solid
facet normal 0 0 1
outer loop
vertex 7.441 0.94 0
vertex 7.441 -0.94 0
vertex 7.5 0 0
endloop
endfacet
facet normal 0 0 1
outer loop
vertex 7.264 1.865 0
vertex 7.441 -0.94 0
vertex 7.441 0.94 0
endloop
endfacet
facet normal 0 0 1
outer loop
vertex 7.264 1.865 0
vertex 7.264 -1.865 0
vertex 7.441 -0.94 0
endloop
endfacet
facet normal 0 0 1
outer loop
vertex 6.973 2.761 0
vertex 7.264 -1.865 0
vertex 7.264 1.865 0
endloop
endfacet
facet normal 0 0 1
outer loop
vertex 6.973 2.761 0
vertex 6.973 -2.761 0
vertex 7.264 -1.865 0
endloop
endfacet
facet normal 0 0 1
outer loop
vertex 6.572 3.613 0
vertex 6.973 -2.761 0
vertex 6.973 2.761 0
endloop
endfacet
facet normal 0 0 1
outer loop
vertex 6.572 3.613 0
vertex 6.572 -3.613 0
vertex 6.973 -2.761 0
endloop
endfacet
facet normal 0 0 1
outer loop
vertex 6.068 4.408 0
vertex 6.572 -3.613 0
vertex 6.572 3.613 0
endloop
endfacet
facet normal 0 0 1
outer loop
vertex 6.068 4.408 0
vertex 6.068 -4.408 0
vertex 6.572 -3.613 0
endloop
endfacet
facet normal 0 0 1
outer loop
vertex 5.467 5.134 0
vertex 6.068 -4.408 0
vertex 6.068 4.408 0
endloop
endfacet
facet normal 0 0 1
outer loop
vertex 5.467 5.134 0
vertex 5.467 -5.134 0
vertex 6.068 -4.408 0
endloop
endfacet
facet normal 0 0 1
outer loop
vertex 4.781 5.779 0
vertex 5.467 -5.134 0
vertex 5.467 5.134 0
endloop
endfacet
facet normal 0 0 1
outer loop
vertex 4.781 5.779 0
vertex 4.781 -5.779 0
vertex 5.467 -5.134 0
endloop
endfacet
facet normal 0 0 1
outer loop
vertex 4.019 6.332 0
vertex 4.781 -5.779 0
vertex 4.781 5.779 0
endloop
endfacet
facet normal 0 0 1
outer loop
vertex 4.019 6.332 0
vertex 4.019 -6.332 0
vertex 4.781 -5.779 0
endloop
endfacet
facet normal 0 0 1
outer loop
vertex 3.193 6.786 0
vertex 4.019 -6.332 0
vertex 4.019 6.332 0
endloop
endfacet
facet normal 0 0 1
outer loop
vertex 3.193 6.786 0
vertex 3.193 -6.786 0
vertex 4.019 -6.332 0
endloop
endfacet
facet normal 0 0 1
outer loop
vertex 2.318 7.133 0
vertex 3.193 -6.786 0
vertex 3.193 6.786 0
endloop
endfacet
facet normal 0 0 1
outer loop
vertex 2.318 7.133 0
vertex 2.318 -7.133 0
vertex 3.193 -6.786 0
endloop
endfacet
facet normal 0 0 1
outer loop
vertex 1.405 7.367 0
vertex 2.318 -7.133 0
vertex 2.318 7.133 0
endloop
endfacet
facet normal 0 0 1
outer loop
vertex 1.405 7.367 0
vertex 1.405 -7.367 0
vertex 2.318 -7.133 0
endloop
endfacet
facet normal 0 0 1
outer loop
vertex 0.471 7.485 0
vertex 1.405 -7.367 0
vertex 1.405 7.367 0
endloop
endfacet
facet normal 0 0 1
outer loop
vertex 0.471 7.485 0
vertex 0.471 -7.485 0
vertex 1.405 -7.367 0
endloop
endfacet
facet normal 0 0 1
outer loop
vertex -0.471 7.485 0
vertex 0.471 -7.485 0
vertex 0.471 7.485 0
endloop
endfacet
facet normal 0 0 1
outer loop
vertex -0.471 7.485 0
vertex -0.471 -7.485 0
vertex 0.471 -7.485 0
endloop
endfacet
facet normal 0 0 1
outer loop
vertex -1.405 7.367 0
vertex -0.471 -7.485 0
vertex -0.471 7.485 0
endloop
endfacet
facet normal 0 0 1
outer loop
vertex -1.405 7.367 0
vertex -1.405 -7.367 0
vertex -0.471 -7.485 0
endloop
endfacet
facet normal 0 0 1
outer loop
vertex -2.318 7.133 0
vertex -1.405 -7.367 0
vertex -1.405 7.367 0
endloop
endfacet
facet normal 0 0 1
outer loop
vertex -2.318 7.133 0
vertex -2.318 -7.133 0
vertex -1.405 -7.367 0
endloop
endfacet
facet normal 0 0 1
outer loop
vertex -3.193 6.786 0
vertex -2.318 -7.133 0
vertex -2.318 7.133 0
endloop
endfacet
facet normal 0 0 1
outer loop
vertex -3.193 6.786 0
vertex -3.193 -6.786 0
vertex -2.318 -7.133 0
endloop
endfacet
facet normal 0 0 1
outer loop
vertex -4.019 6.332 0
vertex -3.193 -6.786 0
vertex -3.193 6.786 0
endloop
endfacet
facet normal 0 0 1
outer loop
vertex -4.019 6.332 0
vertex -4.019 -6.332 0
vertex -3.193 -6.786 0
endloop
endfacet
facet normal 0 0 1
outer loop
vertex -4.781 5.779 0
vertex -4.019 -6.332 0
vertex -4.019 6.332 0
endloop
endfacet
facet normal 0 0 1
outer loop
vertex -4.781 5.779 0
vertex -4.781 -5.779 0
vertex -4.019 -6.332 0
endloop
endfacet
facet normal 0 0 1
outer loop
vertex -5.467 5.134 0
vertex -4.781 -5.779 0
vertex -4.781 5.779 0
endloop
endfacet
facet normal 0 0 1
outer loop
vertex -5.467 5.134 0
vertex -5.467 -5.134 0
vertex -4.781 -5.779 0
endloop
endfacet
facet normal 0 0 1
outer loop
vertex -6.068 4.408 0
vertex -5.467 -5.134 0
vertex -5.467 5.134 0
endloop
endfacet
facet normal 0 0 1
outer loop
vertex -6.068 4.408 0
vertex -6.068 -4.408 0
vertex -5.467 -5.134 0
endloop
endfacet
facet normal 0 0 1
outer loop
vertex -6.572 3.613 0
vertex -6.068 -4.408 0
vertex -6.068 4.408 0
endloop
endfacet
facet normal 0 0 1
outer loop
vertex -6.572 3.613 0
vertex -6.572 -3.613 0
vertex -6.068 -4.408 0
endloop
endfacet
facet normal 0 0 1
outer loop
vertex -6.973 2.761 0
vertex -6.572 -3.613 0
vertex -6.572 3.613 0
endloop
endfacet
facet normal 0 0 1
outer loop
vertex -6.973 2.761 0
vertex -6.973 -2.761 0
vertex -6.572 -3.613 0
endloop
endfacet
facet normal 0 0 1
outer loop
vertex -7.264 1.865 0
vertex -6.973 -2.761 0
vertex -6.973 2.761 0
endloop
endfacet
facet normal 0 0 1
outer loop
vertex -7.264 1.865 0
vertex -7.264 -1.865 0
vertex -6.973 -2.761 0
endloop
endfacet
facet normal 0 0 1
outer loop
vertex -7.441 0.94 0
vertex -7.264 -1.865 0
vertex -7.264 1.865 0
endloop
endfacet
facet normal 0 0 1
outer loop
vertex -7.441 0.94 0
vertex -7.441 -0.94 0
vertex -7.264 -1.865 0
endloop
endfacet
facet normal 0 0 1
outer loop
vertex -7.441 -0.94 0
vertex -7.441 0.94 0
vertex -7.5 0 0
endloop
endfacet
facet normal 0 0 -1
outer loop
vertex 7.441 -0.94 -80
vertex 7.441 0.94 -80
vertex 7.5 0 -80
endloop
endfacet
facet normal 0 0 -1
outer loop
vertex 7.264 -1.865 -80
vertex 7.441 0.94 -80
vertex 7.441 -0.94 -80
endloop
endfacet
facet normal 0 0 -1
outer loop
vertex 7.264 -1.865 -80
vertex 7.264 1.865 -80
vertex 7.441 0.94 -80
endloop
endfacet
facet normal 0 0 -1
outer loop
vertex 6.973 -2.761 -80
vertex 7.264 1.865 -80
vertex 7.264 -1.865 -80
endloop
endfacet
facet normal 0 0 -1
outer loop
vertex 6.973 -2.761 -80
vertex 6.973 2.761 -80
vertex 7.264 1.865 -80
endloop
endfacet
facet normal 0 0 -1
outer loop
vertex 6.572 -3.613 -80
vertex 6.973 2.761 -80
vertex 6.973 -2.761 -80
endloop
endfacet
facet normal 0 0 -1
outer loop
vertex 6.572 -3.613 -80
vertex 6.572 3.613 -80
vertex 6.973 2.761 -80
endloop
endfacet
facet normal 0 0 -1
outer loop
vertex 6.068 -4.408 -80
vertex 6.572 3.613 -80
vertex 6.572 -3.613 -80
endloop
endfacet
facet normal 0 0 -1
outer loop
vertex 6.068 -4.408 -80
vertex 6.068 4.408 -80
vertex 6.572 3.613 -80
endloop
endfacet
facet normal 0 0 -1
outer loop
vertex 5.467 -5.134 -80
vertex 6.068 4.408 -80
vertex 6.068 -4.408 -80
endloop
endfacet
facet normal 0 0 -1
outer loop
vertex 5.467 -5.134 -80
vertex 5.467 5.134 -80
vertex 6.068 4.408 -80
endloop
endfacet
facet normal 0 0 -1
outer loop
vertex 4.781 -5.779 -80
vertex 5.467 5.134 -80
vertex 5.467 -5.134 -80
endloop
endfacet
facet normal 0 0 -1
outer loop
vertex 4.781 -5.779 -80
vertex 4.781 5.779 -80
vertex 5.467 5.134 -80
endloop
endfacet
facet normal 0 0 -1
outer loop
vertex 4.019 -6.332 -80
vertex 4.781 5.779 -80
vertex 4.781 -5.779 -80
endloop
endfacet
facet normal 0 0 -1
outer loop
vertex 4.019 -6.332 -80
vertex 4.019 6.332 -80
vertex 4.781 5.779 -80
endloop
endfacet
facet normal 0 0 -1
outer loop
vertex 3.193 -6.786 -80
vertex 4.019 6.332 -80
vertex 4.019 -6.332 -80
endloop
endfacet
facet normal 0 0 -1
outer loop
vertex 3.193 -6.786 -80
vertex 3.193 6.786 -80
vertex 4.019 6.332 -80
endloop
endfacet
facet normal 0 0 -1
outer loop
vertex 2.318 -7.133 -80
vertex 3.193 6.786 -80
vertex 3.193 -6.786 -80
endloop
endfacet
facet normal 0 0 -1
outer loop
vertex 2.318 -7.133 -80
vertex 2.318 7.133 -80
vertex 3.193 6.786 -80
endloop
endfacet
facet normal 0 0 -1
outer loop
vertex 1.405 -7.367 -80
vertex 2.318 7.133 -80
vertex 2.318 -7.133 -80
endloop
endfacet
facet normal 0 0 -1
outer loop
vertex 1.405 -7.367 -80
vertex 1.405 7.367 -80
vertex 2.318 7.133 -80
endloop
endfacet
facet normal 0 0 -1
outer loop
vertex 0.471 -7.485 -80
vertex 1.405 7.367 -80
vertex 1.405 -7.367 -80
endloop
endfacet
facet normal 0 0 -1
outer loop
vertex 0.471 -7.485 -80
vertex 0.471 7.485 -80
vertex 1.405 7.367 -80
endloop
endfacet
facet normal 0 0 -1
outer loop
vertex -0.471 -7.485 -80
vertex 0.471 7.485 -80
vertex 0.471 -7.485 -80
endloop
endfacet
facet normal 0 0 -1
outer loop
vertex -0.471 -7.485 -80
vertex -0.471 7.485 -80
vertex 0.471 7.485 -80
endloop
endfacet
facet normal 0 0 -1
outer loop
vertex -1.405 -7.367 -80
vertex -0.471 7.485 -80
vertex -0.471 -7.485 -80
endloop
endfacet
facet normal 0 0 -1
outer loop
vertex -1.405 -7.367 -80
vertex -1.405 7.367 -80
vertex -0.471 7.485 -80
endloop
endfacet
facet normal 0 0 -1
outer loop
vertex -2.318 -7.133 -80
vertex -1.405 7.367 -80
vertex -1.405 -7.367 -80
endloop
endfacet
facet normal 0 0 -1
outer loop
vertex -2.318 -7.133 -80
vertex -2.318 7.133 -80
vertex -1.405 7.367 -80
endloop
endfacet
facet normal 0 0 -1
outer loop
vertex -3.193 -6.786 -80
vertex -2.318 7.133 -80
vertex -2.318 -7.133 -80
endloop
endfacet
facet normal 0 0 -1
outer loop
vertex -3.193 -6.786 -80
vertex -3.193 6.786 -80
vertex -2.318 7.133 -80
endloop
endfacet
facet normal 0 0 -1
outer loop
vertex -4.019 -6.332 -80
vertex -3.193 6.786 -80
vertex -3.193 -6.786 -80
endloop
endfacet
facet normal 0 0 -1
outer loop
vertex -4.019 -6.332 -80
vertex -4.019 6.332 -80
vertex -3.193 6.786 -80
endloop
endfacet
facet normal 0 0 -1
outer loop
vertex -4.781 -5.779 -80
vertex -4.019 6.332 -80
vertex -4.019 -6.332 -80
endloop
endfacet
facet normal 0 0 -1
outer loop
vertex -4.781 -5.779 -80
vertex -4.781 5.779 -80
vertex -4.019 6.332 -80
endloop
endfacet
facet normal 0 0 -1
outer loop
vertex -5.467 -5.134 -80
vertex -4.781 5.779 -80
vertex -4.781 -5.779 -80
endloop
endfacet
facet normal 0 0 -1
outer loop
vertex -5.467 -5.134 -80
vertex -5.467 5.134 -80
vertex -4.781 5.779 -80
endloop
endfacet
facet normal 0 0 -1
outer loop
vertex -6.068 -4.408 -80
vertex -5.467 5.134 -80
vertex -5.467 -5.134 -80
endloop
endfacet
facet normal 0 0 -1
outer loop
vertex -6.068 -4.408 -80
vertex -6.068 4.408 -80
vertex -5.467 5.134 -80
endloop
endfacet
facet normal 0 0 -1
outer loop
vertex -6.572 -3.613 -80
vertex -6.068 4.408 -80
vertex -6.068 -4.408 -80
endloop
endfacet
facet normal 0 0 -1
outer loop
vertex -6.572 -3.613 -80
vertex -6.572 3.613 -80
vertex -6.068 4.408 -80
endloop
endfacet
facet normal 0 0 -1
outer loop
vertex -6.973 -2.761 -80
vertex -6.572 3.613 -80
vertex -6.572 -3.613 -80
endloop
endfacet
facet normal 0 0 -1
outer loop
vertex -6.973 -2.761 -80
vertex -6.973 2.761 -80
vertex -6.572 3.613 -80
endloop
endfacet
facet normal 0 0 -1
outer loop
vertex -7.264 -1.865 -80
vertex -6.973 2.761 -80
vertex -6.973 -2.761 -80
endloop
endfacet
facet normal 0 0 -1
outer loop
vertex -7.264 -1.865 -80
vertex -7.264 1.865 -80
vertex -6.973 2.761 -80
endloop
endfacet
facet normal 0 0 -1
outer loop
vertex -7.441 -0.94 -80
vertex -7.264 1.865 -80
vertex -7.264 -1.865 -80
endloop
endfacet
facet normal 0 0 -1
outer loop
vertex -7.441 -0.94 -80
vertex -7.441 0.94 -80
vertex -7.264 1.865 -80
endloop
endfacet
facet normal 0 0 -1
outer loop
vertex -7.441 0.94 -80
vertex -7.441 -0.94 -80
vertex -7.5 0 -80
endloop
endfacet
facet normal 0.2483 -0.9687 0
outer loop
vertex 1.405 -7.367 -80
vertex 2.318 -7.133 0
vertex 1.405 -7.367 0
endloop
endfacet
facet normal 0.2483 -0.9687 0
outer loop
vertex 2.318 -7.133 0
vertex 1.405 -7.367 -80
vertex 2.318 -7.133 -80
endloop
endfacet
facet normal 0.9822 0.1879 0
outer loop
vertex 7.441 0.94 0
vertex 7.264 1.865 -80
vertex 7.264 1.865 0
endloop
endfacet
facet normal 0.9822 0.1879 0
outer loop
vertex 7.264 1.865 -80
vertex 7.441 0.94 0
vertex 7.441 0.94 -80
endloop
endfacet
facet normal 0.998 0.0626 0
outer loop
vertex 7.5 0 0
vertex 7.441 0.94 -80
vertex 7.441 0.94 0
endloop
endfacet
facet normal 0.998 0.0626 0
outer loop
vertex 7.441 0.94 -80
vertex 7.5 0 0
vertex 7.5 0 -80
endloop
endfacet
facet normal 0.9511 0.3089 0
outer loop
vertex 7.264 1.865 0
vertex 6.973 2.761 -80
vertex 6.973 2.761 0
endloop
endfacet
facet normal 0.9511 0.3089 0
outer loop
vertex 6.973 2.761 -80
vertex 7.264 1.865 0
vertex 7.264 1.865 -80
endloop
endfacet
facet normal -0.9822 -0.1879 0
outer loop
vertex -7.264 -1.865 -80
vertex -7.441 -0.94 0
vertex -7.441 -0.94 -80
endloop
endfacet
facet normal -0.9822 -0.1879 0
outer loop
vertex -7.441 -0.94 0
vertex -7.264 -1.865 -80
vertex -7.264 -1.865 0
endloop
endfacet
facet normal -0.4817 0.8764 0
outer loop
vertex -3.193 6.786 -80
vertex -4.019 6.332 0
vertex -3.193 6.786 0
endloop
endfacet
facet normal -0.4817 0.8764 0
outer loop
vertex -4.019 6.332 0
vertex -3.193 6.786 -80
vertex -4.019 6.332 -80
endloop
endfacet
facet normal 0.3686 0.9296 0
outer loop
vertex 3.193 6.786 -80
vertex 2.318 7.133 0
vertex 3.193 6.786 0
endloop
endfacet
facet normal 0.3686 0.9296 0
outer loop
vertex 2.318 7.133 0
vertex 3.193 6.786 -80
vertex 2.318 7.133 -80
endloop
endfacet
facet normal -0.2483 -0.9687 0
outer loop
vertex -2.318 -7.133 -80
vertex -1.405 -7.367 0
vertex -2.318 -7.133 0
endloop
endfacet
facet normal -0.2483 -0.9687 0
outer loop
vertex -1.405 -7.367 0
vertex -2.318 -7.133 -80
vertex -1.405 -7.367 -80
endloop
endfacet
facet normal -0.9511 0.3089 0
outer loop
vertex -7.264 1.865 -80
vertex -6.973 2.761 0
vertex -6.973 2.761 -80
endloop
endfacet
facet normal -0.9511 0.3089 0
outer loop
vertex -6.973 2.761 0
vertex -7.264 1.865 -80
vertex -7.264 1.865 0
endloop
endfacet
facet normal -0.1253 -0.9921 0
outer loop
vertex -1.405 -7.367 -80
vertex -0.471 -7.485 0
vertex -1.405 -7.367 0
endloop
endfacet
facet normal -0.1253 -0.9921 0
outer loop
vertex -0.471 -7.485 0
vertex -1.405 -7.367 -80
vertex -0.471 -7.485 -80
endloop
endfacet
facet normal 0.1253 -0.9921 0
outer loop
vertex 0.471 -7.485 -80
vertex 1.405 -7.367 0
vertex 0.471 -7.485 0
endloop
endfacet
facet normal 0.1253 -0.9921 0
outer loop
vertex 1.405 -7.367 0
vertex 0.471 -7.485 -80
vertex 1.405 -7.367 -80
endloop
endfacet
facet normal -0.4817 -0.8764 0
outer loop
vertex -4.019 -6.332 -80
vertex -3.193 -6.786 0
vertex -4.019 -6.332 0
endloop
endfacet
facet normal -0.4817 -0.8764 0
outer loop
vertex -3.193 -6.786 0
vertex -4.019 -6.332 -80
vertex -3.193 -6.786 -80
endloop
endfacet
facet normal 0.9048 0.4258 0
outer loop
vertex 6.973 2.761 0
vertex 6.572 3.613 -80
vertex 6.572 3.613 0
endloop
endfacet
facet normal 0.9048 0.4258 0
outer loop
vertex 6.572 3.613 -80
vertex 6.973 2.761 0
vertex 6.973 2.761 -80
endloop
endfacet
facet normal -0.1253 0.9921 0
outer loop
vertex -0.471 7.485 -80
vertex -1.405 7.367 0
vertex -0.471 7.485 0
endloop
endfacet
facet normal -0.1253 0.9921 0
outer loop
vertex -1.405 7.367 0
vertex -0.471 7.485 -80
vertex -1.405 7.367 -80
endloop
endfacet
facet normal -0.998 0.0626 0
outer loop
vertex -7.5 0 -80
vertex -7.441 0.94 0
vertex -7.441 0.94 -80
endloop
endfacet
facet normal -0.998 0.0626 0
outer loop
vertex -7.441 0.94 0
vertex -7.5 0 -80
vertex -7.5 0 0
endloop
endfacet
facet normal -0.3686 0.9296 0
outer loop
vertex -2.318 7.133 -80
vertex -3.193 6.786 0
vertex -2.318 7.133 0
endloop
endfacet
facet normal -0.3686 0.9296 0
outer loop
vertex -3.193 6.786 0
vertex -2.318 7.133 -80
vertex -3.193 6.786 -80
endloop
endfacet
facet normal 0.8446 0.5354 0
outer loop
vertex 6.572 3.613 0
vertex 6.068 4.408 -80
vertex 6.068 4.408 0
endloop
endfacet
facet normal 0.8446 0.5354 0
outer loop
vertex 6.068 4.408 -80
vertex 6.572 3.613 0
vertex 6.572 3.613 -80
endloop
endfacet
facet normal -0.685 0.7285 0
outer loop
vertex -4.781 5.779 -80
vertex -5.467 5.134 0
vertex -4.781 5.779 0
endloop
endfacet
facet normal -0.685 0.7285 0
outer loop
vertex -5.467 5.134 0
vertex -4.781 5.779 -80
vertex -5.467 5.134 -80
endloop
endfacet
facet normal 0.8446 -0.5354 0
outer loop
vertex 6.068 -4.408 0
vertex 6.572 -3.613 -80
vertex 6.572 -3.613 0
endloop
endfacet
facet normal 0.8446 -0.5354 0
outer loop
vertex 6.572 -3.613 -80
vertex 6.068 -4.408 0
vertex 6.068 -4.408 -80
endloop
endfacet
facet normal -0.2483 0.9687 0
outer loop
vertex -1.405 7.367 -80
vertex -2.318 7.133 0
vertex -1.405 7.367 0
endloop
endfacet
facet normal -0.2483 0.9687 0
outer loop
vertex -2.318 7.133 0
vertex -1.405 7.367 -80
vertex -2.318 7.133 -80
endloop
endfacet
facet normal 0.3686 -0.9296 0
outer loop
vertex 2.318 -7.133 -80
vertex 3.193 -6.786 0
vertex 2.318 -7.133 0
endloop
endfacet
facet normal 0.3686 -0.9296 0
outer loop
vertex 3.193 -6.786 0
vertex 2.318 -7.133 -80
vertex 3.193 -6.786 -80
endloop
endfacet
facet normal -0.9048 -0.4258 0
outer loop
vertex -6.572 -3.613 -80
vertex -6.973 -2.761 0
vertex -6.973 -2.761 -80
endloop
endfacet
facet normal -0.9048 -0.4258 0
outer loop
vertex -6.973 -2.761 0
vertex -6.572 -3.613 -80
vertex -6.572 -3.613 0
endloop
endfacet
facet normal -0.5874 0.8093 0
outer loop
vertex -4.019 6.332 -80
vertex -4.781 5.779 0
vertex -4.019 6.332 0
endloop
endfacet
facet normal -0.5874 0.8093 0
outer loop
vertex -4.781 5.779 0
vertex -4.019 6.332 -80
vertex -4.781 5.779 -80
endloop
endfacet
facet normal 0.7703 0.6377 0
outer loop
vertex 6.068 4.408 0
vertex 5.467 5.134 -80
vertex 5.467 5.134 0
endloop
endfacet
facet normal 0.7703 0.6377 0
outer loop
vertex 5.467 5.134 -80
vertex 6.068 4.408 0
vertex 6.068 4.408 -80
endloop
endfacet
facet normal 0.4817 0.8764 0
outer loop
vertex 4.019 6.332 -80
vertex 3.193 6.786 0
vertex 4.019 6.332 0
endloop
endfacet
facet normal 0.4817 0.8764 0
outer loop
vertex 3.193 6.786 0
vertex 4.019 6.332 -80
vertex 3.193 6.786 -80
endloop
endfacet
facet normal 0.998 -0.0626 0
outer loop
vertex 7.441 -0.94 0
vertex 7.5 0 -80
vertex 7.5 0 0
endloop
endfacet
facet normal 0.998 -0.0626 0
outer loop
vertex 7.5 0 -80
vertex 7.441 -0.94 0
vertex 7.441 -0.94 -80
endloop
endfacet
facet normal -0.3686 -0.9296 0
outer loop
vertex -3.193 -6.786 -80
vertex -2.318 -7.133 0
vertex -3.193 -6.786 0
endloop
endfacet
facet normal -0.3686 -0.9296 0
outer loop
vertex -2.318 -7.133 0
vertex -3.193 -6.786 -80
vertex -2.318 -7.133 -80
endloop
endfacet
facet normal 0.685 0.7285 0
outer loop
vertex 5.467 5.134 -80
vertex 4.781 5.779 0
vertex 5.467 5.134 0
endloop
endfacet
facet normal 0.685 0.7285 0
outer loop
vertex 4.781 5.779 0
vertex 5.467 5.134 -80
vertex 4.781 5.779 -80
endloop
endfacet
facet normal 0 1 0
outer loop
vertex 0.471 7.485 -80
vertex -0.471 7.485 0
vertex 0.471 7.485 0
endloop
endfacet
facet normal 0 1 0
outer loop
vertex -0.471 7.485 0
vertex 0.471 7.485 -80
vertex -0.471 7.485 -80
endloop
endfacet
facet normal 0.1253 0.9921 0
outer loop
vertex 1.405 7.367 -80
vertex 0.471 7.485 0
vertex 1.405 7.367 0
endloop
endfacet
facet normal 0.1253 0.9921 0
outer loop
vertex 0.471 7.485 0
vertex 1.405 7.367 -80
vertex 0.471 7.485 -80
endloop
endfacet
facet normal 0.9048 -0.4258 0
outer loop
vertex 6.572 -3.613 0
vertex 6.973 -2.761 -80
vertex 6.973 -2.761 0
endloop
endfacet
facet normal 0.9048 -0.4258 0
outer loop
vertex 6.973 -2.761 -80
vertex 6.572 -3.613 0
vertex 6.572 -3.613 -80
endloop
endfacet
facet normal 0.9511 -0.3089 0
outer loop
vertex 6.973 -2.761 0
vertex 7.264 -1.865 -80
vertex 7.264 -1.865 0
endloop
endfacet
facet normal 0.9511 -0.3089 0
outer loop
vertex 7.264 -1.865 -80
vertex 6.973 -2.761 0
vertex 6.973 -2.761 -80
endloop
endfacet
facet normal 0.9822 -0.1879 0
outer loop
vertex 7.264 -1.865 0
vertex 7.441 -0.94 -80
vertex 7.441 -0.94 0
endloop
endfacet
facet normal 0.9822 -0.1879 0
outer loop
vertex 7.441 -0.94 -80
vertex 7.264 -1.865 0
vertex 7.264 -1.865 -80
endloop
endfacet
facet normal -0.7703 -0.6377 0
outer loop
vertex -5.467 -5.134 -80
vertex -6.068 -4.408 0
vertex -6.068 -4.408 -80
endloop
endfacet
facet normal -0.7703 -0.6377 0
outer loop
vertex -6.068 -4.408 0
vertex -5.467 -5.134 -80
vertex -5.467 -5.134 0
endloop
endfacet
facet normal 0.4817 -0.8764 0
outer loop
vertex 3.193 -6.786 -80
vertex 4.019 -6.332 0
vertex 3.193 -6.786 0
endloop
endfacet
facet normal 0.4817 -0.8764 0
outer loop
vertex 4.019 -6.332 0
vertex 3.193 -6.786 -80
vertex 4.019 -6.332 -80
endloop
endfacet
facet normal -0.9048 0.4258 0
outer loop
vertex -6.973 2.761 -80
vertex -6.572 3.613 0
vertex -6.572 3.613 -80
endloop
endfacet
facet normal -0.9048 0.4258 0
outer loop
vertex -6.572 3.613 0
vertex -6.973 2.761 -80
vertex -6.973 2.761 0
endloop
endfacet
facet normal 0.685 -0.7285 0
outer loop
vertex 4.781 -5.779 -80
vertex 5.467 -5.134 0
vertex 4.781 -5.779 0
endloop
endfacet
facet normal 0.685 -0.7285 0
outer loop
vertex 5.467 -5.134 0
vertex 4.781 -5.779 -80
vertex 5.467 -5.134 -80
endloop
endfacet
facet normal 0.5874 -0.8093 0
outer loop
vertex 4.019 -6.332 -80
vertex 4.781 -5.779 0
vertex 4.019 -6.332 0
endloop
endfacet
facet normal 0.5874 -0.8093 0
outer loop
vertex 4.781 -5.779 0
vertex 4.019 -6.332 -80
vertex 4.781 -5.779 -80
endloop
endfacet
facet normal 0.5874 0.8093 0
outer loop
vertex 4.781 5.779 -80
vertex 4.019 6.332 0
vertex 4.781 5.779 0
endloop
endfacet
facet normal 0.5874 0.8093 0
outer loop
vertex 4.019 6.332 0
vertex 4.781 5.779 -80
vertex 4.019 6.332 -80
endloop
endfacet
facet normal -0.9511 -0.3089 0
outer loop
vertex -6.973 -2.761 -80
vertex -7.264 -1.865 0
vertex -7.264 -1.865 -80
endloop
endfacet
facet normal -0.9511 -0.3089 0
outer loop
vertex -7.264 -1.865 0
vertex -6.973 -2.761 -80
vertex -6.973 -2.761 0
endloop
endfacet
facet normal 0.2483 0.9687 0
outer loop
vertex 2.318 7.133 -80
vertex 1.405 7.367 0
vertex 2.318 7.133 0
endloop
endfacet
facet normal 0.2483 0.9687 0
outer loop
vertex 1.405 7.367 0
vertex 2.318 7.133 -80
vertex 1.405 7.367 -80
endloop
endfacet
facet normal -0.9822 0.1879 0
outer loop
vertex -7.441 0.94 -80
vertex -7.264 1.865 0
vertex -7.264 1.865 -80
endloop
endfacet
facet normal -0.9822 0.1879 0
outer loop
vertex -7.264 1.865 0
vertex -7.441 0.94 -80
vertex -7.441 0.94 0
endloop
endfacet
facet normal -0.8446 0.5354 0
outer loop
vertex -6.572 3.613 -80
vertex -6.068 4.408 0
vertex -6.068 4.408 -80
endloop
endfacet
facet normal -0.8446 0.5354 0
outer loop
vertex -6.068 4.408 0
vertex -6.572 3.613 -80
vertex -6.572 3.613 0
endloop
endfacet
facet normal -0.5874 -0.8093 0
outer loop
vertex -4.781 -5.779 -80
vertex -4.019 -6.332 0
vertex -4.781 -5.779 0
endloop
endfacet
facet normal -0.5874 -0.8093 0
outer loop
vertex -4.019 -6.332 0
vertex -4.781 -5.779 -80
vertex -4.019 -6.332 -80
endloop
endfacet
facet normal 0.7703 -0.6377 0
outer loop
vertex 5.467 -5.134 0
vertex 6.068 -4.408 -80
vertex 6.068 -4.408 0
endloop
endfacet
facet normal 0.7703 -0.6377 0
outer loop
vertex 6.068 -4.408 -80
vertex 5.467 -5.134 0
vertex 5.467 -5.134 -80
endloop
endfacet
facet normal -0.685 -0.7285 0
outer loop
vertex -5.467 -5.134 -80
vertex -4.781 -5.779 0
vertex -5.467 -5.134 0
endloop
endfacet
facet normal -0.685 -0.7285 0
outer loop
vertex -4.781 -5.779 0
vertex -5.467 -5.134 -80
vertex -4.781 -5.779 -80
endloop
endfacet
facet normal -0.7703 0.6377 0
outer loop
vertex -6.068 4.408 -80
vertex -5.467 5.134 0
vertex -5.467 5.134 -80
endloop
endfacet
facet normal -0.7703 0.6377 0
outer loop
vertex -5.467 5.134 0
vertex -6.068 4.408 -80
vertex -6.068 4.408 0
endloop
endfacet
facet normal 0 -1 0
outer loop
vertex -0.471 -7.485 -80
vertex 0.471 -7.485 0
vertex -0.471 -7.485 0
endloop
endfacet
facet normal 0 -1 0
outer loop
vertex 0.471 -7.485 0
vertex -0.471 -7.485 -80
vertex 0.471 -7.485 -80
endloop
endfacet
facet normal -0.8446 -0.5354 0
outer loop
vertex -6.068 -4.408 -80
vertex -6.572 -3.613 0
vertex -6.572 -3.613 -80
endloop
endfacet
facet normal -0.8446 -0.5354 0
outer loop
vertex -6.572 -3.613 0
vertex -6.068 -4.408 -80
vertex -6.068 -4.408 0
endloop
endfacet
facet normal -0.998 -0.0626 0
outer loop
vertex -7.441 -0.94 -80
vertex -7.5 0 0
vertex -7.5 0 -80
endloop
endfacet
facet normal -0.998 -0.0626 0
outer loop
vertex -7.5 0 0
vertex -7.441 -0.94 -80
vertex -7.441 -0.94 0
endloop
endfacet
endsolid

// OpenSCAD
$fn = 50;


difference() {
	union() {
		translate(v = [0, 0, 0]) {
			rotate(a = [0, 0, 0]) {
				difference() {
					union() {
						#translate(v = [0, 0, -3.7000000000]) {
							cylinder(h = 3.7000000000, r = 7.5000000000, r1 = 2.0000000000, r2 = 4.9000000000);
						}
						#translate(v = [0, 0, -80.0000000000]) {
							cylinder(h = 80, r = 2.0000000000);
						}
						#translate(v = [0, 0, -80.0000000000]) {
							cylinder(h = 80, r = 2.2500000000);
						}
						#translate(v = [0, 0, -80.0000000000]) {
							cylinder(h = 80, r = 2.0000000000);
						}
					}
					union();
				}
			}
		}
		translate(v = [0, 0, -80.0000000000]) {
			cylinder(h = 80, r = 7.5000000000);
		}
	}
	union();
}
